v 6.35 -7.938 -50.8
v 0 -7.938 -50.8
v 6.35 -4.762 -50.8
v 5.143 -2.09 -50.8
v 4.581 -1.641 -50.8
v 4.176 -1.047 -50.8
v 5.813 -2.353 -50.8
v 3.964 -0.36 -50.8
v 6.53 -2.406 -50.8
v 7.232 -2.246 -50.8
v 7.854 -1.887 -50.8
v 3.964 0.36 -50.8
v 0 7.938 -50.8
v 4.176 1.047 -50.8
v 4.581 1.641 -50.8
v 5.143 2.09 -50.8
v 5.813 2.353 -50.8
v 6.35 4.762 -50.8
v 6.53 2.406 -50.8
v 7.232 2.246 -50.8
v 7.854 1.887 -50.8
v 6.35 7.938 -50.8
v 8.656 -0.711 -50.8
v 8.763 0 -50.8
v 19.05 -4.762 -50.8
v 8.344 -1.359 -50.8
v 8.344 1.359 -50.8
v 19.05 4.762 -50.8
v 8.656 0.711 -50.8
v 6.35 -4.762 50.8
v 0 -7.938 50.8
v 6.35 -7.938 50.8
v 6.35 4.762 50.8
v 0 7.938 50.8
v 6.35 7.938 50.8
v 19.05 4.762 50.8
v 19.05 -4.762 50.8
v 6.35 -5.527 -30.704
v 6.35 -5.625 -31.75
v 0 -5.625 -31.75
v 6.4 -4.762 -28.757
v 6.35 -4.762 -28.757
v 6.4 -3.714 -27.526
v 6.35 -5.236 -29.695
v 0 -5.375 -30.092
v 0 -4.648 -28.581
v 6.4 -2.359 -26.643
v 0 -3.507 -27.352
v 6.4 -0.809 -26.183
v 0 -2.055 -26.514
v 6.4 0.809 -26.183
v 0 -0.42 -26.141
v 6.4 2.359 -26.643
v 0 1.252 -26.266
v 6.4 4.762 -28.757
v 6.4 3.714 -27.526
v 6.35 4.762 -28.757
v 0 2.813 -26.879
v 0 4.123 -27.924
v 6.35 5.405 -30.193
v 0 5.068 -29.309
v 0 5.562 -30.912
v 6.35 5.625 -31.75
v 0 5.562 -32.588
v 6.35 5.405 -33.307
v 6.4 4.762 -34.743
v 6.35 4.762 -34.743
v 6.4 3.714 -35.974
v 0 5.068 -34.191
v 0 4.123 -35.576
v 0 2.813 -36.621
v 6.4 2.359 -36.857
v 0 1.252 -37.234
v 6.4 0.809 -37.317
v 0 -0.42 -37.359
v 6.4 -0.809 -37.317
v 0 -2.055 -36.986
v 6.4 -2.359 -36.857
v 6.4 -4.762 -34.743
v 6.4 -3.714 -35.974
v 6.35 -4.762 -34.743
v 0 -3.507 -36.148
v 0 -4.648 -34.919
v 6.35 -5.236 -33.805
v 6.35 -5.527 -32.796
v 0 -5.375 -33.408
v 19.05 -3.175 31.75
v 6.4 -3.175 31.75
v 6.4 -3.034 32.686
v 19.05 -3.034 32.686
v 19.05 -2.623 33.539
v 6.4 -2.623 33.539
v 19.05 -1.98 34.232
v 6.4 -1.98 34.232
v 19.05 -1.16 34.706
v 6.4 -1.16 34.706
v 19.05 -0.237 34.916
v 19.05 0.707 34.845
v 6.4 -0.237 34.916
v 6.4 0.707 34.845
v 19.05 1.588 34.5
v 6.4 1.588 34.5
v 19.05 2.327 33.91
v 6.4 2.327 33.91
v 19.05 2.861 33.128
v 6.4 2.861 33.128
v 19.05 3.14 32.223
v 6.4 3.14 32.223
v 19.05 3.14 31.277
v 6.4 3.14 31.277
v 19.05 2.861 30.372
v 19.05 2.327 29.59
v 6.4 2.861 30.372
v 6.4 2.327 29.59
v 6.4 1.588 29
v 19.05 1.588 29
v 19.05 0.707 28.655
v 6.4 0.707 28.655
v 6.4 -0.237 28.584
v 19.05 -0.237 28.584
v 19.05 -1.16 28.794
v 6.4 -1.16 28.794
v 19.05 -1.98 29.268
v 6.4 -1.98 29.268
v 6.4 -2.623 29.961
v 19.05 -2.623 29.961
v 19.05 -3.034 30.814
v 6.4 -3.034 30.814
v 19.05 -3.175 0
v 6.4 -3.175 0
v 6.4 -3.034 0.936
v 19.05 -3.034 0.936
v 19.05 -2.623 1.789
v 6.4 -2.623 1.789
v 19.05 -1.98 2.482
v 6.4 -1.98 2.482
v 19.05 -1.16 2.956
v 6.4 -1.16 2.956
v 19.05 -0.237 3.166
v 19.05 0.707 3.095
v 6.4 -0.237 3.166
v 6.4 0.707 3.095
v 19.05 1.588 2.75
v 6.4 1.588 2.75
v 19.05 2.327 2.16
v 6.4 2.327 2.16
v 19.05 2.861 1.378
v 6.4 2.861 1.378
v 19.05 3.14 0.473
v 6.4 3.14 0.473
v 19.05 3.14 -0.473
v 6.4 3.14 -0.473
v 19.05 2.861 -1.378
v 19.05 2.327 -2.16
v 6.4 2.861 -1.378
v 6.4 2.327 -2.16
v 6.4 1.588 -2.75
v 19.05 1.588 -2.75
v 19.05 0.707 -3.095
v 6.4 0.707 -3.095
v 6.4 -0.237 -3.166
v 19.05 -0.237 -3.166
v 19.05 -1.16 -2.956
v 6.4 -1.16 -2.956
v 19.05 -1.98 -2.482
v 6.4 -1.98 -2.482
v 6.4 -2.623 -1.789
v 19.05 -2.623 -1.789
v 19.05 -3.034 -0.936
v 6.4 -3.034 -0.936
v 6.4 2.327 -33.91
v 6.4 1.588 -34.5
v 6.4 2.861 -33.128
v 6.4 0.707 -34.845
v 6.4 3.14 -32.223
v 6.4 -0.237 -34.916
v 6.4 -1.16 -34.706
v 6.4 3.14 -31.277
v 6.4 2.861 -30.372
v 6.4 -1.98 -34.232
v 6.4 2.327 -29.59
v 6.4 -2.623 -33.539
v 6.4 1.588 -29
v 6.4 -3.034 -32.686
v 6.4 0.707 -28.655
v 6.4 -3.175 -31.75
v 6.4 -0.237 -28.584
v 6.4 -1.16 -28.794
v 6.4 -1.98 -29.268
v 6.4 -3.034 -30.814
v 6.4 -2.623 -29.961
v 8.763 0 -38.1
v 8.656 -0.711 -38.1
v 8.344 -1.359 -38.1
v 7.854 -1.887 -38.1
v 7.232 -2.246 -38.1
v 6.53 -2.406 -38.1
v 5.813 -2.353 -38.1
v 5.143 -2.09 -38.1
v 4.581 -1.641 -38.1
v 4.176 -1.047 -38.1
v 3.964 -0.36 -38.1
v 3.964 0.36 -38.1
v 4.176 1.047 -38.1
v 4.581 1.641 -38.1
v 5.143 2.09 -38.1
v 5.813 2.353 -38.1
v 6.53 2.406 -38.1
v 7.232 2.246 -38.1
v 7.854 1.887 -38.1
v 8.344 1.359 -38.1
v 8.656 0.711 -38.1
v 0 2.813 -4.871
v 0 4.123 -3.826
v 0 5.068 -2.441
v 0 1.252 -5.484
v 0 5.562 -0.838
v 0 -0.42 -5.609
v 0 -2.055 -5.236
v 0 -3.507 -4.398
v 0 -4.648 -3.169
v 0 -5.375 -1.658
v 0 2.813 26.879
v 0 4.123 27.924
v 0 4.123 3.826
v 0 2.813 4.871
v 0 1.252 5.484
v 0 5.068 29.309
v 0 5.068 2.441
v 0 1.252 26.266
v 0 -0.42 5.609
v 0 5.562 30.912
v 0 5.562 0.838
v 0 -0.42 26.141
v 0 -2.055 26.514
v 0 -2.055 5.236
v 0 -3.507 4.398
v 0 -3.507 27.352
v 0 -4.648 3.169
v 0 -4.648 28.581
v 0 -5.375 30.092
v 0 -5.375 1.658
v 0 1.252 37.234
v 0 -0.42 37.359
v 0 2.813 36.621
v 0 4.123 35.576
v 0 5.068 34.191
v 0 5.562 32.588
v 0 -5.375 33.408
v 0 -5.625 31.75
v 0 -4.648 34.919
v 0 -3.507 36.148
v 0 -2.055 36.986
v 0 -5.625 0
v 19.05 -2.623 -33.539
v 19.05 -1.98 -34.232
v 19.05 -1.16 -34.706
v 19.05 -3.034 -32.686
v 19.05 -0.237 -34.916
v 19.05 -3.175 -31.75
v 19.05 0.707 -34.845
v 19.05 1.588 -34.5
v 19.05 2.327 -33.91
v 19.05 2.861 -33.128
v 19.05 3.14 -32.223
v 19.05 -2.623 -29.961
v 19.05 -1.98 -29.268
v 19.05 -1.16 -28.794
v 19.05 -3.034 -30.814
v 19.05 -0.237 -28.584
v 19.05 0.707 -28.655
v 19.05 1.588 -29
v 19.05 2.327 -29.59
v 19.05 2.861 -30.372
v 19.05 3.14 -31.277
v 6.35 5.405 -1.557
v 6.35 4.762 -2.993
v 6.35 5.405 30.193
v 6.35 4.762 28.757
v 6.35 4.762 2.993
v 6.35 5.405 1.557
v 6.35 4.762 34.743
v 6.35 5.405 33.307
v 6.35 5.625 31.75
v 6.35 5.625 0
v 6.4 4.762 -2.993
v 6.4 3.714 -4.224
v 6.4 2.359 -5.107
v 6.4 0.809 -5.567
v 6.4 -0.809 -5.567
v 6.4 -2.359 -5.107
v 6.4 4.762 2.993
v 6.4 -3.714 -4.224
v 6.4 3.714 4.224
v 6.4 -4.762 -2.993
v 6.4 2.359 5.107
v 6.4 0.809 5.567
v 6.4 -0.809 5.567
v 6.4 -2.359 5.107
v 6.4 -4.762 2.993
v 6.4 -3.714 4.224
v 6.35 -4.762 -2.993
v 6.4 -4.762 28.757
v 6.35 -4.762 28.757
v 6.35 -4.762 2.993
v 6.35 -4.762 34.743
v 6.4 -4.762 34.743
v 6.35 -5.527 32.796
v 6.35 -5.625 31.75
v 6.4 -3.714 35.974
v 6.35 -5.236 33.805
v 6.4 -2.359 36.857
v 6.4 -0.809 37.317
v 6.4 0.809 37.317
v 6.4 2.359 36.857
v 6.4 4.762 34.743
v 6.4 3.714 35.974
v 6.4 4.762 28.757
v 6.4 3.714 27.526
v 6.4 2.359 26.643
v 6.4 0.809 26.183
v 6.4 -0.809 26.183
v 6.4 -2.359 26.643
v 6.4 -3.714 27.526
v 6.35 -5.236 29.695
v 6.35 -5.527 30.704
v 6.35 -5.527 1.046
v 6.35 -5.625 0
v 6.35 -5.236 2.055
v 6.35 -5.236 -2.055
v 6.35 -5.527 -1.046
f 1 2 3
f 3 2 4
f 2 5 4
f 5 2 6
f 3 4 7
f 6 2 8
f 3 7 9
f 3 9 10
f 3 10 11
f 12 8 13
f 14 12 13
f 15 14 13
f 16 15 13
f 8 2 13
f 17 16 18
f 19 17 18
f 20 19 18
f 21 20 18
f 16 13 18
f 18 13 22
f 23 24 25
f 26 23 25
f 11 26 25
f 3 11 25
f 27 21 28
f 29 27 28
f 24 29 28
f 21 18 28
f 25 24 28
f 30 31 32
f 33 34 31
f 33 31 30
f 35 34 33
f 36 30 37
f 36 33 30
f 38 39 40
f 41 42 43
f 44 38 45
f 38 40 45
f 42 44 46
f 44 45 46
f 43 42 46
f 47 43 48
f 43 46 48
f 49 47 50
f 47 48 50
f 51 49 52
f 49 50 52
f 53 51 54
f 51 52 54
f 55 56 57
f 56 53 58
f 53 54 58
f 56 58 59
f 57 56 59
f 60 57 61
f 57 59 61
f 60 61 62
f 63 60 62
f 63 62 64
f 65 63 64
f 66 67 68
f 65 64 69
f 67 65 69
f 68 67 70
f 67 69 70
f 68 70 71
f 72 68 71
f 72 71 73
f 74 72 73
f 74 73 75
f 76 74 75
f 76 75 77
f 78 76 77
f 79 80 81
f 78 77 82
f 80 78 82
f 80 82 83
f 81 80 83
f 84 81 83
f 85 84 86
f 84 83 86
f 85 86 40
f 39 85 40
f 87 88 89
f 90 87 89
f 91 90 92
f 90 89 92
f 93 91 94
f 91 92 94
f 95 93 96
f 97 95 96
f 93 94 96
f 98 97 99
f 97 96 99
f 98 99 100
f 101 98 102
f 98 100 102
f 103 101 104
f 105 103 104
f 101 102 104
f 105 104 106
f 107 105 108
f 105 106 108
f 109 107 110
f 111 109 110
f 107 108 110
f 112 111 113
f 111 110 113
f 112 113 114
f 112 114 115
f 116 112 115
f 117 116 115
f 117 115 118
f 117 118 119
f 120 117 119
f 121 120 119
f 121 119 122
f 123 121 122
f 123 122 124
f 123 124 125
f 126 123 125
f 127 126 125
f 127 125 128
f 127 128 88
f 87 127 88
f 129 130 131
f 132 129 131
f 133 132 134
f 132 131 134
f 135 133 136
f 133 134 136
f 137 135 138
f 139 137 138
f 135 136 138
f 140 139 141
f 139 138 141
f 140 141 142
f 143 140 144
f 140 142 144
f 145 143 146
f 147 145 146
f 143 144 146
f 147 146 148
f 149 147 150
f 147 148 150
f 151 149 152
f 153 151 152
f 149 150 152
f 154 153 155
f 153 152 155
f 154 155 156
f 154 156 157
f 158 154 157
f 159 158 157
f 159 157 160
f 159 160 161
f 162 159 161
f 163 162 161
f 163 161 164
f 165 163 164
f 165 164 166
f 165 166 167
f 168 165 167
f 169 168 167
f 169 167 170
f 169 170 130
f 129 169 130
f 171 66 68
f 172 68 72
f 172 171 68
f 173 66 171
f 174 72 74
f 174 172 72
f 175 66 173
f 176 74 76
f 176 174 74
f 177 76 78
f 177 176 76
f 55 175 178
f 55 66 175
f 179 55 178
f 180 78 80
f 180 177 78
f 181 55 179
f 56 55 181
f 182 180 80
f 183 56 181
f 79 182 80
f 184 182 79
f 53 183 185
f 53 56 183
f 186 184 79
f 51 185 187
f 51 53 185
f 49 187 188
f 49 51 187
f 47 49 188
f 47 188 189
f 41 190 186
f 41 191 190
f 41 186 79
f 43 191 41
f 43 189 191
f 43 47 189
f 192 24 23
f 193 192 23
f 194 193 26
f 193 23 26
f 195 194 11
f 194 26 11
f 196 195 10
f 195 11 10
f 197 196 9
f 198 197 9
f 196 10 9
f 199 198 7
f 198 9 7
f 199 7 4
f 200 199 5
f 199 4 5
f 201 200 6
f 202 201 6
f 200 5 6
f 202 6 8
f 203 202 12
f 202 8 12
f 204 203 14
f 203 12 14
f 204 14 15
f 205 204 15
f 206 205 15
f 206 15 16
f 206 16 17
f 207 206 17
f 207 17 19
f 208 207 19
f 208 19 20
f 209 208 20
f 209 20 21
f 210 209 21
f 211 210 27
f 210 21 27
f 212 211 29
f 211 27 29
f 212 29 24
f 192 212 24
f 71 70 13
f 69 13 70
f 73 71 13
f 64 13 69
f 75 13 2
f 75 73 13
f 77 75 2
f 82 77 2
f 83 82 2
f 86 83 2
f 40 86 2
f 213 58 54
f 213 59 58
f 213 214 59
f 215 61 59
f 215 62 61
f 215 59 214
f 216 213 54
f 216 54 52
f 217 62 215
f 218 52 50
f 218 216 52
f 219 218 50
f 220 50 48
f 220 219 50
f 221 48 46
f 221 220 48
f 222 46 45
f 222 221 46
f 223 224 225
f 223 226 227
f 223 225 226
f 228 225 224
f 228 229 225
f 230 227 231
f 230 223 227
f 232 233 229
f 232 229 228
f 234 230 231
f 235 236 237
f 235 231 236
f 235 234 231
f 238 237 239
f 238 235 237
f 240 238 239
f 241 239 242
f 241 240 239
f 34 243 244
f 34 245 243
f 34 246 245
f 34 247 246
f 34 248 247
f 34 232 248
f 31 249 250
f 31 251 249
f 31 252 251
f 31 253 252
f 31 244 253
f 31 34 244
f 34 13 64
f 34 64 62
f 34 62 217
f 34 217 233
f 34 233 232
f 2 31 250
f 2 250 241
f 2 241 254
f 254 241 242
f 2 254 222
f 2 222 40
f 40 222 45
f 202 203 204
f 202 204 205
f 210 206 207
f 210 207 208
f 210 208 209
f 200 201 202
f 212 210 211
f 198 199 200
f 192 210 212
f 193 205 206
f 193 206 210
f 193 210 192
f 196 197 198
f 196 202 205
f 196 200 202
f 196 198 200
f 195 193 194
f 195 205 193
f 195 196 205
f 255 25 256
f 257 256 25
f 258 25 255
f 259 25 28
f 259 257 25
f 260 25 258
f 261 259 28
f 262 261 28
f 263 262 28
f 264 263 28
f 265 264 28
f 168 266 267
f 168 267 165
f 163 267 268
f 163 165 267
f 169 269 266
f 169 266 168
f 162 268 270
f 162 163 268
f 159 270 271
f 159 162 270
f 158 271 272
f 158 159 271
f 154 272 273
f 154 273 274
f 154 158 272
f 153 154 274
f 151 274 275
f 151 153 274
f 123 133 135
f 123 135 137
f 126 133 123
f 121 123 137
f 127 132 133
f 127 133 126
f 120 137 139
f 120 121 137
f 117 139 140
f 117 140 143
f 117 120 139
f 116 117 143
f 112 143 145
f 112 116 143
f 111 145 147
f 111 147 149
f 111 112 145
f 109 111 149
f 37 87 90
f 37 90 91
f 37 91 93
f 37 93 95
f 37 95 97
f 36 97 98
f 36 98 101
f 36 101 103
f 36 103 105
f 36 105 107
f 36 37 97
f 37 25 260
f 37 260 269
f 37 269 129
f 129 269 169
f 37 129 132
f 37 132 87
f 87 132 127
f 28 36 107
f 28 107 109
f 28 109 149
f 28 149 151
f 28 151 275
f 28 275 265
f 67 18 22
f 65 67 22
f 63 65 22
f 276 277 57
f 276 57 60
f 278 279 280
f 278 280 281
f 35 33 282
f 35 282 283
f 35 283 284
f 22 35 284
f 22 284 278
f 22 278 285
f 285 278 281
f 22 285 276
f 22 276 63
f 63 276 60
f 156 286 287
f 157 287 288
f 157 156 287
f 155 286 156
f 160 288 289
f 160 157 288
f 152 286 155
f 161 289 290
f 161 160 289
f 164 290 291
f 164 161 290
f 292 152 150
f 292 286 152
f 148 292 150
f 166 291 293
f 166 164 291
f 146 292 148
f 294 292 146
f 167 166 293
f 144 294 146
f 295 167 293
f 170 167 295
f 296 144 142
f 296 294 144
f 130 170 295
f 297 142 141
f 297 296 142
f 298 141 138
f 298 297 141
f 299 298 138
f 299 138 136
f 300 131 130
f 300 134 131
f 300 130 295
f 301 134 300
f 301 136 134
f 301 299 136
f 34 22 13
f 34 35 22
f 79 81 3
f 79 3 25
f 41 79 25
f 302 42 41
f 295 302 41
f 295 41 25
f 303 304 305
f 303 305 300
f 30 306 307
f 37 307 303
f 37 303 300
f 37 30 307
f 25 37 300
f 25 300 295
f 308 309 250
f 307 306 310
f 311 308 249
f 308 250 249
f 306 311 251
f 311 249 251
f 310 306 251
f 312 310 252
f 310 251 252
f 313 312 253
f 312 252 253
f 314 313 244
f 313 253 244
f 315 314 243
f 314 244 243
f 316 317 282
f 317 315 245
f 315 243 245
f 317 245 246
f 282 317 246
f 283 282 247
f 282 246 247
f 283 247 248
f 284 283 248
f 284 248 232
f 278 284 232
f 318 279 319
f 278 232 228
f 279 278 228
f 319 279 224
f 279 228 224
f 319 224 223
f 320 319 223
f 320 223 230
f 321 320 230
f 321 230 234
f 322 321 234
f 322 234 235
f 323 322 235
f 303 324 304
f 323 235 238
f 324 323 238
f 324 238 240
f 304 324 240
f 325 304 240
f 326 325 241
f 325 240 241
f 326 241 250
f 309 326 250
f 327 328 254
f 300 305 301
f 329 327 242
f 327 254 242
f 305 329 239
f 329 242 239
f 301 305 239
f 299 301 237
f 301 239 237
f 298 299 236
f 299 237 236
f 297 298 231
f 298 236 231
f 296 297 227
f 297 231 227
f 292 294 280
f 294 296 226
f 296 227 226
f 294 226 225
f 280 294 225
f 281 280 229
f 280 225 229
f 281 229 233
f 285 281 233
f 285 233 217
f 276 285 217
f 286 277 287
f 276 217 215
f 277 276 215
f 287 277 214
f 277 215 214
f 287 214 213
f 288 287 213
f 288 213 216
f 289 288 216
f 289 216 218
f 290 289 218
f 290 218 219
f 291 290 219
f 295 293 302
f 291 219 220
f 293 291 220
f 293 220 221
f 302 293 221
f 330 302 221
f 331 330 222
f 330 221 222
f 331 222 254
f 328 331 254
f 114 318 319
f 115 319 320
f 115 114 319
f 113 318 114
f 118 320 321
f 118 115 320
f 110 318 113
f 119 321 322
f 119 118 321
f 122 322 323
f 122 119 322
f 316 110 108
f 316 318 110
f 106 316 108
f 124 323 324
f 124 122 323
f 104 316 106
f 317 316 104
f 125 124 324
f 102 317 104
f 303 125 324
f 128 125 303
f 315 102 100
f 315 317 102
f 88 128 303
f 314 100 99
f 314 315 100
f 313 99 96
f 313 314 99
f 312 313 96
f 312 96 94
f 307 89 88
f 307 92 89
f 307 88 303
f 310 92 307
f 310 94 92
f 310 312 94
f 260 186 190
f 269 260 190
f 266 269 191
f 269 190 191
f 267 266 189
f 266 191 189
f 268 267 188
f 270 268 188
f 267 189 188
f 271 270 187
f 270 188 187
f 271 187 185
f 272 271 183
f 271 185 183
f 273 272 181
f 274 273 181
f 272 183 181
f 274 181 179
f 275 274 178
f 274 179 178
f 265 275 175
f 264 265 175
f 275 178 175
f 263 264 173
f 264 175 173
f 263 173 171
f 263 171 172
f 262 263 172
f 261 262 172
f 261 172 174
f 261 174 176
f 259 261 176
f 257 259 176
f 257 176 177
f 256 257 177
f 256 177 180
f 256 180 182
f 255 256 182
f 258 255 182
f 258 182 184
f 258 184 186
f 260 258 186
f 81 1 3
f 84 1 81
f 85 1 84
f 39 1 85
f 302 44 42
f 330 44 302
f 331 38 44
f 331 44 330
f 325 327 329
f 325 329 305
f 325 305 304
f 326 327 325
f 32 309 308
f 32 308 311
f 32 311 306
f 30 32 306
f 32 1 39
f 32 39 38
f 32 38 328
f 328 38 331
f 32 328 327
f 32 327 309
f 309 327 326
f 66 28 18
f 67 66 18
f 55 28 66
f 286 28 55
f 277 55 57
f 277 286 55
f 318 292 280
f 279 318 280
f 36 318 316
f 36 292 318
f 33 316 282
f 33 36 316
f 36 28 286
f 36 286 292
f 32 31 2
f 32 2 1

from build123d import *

# Parameters (mm, degrees)
F1_DEPTH = 50.8
F2_R     = 3.175
F3_DEPTH = 19.051
F4_R     = 5.625
F5_DEPTH = 6.4
F6_R     = 2.413
F7_DEPTH = 12.7


with BuildPart() as f1:
    # F0 (on Top) → F1 (new body, symmetric)
    with BuildSketch(Plane.XY):
        Polygon((6.35, 7.9375), (0, 7.9375), (0, -7.9375), (6.35, -7.9375), (6.35, -4.7625), (16.637, -4.7625), (19.05, -4.7625), (19.05, 4.7625), (16.637, 4.7625), (6.35, 4.7625), align=None)
    extrude(amount=F1_DEPTH, both=True)

    # F2 (on face) → F3 (cut, through all)
    with BuildSketch(Plane(origin=(0, 0, 0), x_dir=(0, -1, 0), z_dir=(-1, 0, 0))):
        with Locations((0, 31.75)):
            Circle(F2_R)
        Circle(F2_R)
        with Locations((0, -31.75)):
            Circle(F2_R)
    extrude(amount=-F3_DEPTH, mode=Mode.SUBTRACT)

    # F4 (on face) → F5 (cut)
    with BuildSketch(Plane(origin=(0, 0, 0), x_dir=(0, -1, 0), z_dir=(-1, 0, 0))):
        with Locations((0, 31.75)):
            Circle(F4_R)
        Circle(F4_R)
        with Locations((0, -31.75)):
            Circle(F4_R)
    extrude(amount=-F5_DEPTH, mode=Mode.SUBTRACT)

    # F6 (on face) → F7 (cut)
    with BuildSketch(Plane(origin=(0, 0, -50.8), x_dir=(1, 0, 0), z_dir=(0, 0, -1))):
        with Locations((6.35, 0)):
            Circle(F6_R)
    extrude(amount=-F7_DEPTH, mode=Mode.SUBTRACT)


solid = f1.part
